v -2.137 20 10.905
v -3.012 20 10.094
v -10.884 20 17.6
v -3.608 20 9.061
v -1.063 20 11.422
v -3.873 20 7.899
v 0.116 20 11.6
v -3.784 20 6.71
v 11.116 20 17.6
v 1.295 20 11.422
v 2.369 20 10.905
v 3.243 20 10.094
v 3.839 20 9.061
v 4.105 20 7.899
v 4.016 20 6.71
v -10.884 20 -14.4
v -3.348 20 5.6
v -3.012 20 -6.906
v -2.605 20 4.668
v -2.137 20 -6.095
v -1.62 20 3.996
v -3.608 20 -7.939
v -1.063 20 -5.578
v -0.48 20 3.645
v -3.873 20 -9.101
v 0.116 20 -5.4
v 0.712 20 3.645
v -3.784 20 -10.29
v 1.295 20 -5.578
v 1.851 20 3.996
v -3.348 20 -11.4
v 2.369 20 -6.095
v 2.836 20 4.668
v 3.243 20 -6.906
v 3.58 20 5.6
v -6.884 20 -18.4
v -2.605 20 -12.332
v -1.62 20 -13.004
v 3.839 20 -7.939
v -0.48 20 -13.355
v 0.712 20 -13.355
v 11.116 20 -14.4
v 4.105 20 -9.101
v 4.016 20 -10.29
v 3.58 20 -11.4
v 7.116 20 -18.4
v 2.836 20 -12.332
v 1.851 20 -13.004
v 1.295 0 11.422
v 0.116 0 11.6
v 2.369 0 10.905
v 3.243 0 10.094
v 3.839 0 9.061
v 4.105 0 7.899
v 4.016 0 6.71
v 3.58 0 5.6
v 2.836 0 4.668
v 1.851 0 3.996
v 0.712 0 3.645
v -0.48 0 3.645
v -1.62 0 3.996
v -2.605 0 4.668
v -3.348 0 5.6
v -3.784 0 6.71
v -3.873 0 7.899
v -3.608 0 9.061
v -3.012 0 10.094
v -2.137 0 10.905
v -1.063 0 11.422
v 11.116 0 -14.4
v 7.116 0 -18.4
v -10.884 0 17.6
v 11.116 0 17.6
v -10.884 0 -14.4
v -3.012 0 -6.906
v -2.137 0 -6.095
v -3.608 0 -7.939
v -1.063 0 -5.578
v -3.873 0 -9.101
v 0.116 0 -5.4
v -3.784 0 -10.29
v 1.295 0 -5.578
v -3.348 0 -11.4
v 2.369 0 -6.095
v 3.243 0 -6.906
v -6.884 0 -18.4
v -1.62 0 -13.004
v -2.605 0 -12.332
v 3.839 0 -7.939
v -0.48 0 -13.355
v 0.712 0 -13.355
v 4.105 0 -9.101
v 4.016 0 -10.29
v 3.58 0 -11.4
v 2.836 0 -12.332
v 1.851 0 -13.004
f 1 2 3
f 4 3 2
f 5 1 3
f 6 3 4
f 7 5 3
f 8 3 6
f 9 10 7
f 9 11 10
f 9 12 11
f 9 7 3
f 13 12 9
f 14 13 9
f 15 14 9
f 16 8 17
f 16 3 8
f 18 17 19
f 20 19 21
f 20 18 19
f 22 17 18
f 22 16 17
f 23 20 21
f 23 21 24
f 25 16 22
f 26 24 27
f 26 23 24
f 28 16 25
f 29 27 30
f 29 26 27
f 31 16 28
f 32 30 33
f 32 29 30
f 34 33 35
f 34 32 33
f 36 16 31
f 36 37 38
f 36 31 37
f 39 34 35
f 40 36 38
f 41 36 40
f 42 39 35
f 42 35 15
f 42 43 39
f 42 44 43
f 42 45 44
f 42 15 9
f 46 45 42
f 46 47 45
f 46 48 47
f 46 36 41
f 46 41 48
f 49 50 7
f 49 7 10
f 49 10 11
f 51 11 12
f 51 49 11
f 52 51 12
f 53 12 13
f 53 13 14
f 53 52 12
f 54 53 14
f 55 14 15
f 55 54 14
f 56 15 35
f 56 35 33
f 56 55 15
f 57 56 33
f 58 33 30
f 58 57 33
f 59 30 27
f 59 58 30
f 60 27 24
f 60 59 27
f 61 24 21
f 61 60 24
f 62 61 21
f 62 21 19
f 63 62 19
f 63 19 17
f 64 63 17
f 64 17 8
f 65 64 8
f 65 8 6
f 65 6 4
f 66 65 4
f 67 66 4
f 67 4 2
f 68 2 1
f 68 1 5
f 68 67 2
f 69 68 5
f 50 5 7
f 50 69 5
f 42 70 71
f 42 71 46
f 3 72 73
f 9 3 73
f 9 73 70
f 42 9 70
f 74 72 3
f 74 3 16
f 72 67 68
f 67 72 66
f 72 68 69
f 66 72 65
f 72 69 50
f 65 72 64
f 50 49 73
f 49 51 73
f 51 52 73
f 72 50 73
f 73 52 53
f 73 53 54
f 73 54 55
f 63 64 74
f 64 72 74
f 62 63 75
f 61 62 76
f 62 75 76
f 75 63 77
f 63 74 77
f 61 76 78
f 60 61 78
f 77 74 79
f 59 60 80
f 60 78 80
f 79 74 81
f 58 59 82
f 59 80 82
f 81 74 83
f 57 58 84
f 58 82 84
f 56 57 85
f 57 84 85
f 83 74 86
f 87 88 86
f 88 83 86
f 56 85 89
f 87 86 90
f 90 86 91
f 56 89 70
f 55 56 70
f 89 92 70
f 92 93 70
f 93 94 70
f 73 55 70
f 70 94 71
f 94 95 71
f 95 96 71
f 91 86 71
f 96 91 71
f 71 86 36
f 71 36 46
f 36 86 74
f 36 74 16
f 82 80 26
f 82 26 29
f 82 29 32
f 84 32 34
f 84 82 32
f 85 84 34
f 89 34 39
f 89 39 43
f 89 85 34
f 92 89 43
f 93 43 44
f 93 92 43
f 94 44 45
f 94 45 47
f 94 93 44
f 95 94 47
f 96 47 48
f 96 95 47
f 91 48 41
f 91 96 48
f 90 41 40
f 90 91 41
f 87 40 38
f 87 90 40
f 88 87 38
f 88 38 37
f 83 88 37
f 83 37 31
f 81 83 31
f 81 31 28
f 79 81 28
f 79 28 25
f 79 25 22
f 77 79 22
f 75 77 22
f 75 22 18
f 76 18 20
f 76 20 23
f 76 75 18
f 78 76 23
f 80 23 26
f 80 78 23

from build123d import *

# Parameters (mm, degrees)
SKETCH_1_W      = 22
SKETCH_1_H      = 36
SKETCH_1_R      = 4
EXTRUDE_1_DEPTH = 20
CHAMFER_1_SIZE  = 4


with BuildPart() as part:
    # 草图1 → 凸台-拉伸1 (new body)
    with BuildSketch(Plane(origin=(0, 0, 0), x_dir=(1, 0, 0), z_dir=(0, 1, 0))):
        with Locations((0.115789474, 0.4)):
            Rectangle(SKETCH_1_W, SKETCH_1_H)
        with Locations(Location((0.115789474, -7.6, 0), (0, 0, 270))):
            Circle(SKETCH_1_R, mode=Mode.SUBTRACT)
        with Locations(Location((0.115789474, 9.4, 0), (0, 0, 270))):
            Circle(SKETCH_1_R, mode=Mode.SUBTRACT)
    extrude(amount=EXTRUDE_1_DEPTH)

    # 倒角1
    chamfer_1_edges = [part.edges().sort_by_distance(p)[0] for p in [
        (-10.884210526, 10, -18.4),
        (11.115789474, 10, -18.4),
    ]]
    chamfer(chamfer_1_edges, length=CHAMFER_1_SIZE)


solid = part.part
